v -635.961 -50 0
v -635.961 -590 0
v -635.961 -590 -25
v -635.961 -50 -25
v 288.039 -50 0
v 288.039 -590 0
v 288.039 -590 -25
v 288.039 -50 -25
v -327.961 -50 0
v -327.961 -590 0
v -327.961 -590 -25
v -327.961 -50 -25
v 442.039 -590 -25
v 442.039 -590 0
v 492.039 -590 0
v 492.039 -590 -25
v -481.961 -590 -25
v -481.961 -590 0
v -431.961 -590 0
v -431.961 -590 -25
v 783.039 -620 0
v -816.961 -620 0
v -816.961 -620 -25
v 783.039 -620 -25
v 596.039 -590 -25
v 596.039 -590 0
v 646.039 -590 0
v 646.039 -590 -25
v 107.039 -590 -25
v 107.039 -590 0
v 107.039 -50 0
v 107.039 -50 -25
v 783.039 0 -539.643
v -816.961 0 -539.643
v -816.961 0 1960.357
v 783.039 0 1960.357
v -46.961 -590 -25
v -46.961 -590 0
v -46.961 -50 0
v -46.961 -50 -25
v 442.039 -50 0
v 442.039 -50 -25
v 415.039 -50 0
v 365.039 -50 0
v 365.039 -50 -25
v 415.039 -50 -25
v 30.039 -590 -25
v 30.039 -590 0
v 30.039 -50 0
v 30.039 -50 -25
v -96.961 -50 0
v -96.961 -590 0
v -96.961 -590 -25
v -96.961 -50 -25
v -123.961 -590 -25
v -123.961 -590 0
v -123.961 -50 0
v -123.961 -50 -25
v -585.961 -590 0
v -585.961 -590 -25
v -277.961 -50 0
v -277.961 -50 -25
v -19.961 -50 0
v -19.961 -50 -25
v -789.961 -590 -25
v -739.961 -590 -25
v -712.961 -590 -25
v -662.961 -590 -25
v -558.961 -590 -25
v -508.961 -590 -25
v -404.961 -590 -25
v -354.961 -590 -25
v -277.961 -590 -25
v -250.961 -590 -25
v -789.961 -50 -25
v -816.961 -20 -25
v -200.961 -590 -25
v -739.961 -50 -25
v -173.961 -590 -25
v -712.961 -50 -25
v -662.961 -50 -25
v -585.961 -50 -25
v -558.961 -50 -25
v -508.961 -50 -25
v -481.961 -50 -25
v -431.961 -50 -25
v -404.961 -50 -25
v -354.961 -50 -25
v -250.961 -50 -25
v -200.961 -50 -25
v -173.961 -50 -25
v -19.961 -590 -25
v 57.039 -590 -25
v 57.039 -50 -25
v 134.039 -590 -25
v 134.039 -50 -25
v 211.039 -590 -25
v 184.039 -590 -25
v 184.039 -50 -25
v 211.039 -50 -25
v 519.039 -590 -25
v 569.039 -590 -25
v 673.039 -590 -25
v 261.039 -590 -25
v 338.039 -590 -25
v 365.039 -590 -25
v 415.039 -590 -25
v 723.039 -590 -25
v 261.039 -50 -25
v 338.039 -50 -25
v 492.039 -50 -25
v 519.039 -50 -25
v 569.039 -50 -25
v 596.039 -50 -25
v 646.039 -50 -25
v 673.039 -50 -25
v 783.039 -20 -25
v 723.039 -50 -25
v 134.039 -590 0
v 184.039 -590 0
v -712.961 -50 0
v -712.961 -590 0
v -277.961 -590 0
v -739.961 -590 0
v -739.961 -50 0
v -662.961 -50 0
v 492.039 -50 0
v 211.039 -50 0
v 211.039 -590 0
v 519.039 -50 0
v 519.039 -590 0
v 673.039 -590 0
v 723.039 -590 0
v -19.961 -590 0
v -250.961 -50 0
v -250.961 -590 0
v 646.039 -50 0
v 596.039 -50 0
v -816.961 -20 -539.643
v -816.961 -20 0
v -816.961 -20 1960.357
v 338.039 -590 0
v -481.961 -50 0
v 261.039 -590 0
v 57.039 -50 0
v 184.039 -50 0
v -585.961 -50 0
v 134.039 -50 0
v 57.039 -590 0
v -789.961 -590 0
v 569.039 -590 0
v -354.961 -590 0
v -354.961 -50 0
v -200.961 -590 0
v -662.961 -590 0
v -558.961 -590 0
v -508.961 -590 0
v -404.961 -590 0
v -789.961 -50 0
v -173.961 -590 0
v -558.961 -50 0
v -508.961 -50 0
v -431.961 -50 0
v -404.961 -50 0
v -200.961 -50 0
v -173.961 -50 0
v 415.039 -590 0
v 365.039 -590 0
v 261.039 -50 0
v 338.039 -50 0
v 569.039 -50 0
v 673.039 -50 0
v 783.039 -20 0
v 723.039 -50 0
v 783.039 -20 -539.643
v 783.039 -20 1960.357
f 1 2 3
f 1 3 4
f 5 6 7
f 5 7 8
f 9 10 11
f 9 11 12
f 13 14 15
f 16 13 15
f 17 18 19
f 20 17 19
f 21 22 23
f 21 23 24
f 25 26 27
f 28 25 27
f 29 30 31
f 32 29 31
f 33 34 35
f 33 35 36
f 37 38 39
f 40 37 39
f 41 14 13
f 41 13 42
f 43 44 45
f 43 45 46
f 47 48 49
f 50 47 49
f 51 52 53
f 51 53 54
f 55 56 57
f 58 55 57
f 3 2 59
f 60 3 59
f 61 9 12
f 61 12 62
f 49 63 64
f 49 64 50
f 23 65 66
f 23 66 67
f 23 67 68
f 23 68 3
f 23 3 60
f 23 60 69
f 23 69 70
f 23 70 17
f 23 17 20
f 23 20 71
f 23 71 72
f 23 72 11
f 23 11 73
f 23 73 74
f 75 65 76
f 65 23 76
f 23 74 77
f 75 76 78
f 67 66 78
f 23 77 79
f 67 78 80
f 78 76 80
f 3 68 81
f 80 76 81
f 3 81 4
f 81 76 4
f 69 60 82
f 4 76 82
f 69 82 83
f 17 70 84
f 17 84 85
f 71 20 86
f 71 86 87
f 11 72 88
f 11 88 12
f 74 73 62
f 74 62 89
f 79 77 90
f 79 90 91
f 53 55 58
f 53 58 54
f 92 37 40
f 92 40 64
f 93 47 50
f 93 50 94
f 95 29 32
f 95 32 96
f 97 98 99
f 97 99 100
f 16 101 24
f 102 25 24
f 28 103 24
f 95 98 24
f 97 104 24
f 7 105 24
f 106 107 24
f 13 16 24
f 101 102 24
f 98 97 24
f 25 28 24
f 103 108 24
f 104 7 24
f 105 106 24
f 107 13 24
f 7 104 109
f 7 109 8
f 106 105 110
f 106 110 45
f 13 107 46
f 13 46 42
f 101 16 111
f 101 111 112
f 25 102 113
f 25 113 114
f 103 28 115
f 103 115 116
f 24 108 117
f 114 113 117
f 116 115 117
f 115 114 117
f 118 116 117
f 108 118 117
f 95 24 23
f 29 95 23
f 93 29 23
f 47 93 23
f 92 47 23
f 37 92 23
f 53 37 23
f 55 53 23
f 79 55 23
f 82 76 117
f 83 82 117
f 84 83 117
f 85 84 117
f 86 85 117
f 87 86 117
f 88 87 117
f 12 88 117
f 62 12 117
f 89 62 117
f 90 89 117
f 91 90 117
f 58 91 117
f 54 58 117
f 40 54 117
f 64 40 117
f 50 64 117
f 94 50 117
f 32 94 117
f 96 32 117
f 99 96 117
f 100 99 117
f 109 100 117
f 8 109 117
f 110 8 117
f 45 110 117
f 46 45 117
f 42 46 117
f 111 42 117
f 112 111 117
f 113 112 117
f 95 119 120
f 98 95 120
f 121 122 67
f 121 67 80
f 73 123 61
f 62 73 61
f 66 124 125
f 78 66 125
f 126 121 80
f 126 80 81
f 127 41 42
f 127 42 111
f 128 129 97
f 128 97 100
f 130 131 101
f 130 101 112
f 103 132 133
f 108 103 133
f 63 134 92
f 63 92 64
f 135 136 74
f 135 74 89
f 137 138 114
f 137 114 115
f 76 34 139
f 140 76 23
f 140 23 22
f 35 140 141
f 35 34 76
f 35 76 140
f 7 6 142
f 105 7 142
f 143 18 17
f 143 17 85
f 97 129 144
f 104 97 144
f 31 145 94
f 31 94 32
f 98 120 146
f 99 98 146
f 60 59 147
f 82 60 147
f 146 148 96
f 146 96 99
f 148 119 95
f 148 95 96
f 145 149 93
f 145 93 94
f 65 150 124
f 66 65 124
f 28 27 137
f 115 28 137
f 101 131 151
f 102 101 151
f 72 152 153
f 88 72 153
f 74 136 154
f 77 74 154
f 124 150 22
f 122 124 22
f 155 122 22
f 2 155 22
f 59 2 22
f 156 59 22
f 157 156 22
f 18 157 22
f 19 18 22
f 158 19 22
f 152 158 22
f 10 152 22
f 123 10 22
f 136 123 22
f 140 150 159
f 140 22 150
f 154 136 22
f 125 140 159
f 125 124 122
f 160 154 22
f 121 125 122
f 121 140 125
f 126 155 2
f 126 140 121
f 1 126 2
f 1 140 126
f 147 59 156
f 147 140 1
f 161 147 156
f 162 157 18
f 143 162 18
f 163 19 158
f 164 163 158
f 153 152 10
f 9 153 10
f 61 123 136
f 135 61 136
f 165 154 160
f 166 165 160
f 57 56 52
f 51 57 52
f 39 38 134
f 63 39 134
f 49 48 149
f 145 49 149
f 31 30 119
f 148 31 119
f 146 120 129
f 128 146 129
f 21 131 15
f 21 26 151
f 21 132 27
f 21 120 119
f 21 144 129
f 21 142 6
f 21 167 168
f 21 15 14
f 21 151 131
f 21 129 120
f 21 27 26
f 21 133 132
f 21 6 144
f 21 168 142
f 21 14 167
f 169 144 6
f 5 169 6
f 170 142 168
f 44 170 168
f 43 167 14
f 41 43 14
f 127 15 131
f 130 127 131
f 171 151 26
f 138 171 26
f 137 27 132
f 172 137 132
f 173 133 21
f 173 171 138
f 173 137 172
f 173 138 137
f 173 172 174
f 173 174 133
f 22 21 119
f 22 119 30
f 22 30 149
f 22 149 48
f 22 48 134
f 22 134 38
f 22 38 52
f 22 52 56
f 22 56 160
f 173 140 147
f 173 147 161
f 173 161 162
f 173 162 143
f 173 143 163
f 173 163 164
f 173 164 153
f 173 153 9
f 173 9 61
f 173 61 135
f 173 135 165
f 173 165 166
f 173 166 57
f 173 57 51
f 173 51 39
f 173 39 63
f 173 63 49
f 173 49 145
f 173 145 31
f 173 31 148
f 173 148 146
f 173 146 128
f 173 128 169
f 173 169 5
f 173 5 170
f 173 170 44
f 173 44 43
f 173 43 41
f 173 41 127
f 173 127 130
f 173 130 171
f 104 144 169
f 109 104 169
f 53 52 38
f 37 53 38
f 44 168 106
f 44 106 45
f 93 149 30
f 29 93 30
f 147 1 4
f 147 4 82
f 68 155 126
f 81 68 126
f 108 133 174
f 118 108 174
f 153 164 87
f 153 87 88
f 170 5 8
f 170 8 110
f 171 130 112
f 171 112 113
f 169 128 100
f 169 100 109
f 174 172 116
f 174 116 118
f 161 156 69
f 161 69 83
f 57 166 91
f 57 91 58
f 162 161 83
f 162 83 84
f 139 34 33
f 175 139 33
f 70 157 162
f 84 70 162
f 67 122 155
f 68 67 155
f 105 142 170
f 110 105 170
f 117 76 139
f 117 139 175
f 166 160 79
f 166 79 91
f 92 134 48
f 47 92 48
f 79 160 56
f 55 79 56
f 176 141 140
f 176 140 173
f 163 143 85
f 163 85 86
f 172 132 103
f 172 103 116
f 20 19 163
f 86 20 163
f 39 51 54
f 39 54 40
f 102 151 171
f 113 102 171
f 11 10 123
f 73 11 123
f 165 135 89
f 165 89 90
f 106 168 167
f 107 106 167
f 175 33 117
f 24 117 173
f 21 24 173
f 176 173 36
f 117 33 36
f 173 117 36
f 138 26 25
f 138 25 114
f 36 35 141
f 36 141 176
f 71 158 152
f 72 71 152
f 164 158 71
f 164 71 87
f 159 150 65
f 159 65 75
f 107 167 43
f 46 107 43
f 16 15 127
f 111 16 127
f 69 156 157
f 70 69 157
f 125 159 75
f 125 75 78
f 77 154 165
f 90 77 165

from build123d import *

# Parameters (mm, degrees)
F0_W     = 1600
F0_H     = 2500
F1_DEPTH = 20
F2_W     = 1600
F2_H     = 25
F3_DEPTH = 600
F4_W     = 50
F4_H     = 540
F5_DEPTH = 216


with BuildPart() as f1:
    # F0 (on Front) → F1 (new body)
    with BuildSketch(Plane.XZ):
        with Locations((-16.960647, 710.356686)):
            Rectangle(F0_W, F0_H)
    extrude(amount=F1_DEPTH)

    # F2 (on face) → F3 (join)
    with BuildSketch(Plane.XZ.offset(20)):
        with Locations((-16.960647, -12.5)):
            Rectangle(F2_W, F2_H)
    extrude(amount=F3_DEPTH)

    # F4 (on face) → F5 (cut)
    with BuildSketch(Plane.XY):
        with Locations((-533.960647, -320)):
            Rectangle(F4_W, F4_H)
        with Locations((-610.960647, -320)):
            Rectangle(F4_W, F4_H)
        with Locations((-687.960647, -320)):
            Rectangle(F4_W, F4_H)
        with Locations((-764.960647, -320)):
            Rectangle(F4_W, F4_H)
        with Locations((-456.960647, -320)):
            Rectangle(F4_W, F4_H)
        with Locations((-302.960647, -320)):
            Rectangle(F4_W, F4_H)
        with Locations((-379.960647, -320)):
            Rectangle(F4_W, F4_H)
        with Locations((698.039353, -320)):
            Rectangle(F4_W, F4_H)
        with Locations((621.039353, -320)):
            Rectangle(F4_W, F4_H)
        with Locations((544.039353, -320)):
            Rectangle(F4_W, F4_H)
        with Locations((467.039353, -320)):
            Rectangle(F4_W, F4_H)
        with Locations((390.039353, -320)):
            Rectangle(F4_W, F4_H)
        with Locations((313.039353, -320)):
            Rectangle(F4_W, F4_H)
        with Locations((236.039353, -320)):
            Rectangle(F4_W, F4_H)
        with Locations((159.039353, -320)):
            Rectangle(F4_W, F4_H)
        with Locations((82.039353, -320)):
            Rectangle(F4_W, F4_H)
        with Locations((5.039353, -320)):
            Rectangle(F4_W, F4_H)
        with Locations((-71.960647, -320)):
            Rectangle(F4_W, F4_H)
        with Locations((-148.960647, -320)):
            Rectangle(F4_W, F4_H)
        with Locations((-225.960647, -320)):
            Rectangle(F4_W, F4_H)
    extrude(amount=-F5_DEPTH, mode=Mode.SUBTRACT)


solid = f1.part
